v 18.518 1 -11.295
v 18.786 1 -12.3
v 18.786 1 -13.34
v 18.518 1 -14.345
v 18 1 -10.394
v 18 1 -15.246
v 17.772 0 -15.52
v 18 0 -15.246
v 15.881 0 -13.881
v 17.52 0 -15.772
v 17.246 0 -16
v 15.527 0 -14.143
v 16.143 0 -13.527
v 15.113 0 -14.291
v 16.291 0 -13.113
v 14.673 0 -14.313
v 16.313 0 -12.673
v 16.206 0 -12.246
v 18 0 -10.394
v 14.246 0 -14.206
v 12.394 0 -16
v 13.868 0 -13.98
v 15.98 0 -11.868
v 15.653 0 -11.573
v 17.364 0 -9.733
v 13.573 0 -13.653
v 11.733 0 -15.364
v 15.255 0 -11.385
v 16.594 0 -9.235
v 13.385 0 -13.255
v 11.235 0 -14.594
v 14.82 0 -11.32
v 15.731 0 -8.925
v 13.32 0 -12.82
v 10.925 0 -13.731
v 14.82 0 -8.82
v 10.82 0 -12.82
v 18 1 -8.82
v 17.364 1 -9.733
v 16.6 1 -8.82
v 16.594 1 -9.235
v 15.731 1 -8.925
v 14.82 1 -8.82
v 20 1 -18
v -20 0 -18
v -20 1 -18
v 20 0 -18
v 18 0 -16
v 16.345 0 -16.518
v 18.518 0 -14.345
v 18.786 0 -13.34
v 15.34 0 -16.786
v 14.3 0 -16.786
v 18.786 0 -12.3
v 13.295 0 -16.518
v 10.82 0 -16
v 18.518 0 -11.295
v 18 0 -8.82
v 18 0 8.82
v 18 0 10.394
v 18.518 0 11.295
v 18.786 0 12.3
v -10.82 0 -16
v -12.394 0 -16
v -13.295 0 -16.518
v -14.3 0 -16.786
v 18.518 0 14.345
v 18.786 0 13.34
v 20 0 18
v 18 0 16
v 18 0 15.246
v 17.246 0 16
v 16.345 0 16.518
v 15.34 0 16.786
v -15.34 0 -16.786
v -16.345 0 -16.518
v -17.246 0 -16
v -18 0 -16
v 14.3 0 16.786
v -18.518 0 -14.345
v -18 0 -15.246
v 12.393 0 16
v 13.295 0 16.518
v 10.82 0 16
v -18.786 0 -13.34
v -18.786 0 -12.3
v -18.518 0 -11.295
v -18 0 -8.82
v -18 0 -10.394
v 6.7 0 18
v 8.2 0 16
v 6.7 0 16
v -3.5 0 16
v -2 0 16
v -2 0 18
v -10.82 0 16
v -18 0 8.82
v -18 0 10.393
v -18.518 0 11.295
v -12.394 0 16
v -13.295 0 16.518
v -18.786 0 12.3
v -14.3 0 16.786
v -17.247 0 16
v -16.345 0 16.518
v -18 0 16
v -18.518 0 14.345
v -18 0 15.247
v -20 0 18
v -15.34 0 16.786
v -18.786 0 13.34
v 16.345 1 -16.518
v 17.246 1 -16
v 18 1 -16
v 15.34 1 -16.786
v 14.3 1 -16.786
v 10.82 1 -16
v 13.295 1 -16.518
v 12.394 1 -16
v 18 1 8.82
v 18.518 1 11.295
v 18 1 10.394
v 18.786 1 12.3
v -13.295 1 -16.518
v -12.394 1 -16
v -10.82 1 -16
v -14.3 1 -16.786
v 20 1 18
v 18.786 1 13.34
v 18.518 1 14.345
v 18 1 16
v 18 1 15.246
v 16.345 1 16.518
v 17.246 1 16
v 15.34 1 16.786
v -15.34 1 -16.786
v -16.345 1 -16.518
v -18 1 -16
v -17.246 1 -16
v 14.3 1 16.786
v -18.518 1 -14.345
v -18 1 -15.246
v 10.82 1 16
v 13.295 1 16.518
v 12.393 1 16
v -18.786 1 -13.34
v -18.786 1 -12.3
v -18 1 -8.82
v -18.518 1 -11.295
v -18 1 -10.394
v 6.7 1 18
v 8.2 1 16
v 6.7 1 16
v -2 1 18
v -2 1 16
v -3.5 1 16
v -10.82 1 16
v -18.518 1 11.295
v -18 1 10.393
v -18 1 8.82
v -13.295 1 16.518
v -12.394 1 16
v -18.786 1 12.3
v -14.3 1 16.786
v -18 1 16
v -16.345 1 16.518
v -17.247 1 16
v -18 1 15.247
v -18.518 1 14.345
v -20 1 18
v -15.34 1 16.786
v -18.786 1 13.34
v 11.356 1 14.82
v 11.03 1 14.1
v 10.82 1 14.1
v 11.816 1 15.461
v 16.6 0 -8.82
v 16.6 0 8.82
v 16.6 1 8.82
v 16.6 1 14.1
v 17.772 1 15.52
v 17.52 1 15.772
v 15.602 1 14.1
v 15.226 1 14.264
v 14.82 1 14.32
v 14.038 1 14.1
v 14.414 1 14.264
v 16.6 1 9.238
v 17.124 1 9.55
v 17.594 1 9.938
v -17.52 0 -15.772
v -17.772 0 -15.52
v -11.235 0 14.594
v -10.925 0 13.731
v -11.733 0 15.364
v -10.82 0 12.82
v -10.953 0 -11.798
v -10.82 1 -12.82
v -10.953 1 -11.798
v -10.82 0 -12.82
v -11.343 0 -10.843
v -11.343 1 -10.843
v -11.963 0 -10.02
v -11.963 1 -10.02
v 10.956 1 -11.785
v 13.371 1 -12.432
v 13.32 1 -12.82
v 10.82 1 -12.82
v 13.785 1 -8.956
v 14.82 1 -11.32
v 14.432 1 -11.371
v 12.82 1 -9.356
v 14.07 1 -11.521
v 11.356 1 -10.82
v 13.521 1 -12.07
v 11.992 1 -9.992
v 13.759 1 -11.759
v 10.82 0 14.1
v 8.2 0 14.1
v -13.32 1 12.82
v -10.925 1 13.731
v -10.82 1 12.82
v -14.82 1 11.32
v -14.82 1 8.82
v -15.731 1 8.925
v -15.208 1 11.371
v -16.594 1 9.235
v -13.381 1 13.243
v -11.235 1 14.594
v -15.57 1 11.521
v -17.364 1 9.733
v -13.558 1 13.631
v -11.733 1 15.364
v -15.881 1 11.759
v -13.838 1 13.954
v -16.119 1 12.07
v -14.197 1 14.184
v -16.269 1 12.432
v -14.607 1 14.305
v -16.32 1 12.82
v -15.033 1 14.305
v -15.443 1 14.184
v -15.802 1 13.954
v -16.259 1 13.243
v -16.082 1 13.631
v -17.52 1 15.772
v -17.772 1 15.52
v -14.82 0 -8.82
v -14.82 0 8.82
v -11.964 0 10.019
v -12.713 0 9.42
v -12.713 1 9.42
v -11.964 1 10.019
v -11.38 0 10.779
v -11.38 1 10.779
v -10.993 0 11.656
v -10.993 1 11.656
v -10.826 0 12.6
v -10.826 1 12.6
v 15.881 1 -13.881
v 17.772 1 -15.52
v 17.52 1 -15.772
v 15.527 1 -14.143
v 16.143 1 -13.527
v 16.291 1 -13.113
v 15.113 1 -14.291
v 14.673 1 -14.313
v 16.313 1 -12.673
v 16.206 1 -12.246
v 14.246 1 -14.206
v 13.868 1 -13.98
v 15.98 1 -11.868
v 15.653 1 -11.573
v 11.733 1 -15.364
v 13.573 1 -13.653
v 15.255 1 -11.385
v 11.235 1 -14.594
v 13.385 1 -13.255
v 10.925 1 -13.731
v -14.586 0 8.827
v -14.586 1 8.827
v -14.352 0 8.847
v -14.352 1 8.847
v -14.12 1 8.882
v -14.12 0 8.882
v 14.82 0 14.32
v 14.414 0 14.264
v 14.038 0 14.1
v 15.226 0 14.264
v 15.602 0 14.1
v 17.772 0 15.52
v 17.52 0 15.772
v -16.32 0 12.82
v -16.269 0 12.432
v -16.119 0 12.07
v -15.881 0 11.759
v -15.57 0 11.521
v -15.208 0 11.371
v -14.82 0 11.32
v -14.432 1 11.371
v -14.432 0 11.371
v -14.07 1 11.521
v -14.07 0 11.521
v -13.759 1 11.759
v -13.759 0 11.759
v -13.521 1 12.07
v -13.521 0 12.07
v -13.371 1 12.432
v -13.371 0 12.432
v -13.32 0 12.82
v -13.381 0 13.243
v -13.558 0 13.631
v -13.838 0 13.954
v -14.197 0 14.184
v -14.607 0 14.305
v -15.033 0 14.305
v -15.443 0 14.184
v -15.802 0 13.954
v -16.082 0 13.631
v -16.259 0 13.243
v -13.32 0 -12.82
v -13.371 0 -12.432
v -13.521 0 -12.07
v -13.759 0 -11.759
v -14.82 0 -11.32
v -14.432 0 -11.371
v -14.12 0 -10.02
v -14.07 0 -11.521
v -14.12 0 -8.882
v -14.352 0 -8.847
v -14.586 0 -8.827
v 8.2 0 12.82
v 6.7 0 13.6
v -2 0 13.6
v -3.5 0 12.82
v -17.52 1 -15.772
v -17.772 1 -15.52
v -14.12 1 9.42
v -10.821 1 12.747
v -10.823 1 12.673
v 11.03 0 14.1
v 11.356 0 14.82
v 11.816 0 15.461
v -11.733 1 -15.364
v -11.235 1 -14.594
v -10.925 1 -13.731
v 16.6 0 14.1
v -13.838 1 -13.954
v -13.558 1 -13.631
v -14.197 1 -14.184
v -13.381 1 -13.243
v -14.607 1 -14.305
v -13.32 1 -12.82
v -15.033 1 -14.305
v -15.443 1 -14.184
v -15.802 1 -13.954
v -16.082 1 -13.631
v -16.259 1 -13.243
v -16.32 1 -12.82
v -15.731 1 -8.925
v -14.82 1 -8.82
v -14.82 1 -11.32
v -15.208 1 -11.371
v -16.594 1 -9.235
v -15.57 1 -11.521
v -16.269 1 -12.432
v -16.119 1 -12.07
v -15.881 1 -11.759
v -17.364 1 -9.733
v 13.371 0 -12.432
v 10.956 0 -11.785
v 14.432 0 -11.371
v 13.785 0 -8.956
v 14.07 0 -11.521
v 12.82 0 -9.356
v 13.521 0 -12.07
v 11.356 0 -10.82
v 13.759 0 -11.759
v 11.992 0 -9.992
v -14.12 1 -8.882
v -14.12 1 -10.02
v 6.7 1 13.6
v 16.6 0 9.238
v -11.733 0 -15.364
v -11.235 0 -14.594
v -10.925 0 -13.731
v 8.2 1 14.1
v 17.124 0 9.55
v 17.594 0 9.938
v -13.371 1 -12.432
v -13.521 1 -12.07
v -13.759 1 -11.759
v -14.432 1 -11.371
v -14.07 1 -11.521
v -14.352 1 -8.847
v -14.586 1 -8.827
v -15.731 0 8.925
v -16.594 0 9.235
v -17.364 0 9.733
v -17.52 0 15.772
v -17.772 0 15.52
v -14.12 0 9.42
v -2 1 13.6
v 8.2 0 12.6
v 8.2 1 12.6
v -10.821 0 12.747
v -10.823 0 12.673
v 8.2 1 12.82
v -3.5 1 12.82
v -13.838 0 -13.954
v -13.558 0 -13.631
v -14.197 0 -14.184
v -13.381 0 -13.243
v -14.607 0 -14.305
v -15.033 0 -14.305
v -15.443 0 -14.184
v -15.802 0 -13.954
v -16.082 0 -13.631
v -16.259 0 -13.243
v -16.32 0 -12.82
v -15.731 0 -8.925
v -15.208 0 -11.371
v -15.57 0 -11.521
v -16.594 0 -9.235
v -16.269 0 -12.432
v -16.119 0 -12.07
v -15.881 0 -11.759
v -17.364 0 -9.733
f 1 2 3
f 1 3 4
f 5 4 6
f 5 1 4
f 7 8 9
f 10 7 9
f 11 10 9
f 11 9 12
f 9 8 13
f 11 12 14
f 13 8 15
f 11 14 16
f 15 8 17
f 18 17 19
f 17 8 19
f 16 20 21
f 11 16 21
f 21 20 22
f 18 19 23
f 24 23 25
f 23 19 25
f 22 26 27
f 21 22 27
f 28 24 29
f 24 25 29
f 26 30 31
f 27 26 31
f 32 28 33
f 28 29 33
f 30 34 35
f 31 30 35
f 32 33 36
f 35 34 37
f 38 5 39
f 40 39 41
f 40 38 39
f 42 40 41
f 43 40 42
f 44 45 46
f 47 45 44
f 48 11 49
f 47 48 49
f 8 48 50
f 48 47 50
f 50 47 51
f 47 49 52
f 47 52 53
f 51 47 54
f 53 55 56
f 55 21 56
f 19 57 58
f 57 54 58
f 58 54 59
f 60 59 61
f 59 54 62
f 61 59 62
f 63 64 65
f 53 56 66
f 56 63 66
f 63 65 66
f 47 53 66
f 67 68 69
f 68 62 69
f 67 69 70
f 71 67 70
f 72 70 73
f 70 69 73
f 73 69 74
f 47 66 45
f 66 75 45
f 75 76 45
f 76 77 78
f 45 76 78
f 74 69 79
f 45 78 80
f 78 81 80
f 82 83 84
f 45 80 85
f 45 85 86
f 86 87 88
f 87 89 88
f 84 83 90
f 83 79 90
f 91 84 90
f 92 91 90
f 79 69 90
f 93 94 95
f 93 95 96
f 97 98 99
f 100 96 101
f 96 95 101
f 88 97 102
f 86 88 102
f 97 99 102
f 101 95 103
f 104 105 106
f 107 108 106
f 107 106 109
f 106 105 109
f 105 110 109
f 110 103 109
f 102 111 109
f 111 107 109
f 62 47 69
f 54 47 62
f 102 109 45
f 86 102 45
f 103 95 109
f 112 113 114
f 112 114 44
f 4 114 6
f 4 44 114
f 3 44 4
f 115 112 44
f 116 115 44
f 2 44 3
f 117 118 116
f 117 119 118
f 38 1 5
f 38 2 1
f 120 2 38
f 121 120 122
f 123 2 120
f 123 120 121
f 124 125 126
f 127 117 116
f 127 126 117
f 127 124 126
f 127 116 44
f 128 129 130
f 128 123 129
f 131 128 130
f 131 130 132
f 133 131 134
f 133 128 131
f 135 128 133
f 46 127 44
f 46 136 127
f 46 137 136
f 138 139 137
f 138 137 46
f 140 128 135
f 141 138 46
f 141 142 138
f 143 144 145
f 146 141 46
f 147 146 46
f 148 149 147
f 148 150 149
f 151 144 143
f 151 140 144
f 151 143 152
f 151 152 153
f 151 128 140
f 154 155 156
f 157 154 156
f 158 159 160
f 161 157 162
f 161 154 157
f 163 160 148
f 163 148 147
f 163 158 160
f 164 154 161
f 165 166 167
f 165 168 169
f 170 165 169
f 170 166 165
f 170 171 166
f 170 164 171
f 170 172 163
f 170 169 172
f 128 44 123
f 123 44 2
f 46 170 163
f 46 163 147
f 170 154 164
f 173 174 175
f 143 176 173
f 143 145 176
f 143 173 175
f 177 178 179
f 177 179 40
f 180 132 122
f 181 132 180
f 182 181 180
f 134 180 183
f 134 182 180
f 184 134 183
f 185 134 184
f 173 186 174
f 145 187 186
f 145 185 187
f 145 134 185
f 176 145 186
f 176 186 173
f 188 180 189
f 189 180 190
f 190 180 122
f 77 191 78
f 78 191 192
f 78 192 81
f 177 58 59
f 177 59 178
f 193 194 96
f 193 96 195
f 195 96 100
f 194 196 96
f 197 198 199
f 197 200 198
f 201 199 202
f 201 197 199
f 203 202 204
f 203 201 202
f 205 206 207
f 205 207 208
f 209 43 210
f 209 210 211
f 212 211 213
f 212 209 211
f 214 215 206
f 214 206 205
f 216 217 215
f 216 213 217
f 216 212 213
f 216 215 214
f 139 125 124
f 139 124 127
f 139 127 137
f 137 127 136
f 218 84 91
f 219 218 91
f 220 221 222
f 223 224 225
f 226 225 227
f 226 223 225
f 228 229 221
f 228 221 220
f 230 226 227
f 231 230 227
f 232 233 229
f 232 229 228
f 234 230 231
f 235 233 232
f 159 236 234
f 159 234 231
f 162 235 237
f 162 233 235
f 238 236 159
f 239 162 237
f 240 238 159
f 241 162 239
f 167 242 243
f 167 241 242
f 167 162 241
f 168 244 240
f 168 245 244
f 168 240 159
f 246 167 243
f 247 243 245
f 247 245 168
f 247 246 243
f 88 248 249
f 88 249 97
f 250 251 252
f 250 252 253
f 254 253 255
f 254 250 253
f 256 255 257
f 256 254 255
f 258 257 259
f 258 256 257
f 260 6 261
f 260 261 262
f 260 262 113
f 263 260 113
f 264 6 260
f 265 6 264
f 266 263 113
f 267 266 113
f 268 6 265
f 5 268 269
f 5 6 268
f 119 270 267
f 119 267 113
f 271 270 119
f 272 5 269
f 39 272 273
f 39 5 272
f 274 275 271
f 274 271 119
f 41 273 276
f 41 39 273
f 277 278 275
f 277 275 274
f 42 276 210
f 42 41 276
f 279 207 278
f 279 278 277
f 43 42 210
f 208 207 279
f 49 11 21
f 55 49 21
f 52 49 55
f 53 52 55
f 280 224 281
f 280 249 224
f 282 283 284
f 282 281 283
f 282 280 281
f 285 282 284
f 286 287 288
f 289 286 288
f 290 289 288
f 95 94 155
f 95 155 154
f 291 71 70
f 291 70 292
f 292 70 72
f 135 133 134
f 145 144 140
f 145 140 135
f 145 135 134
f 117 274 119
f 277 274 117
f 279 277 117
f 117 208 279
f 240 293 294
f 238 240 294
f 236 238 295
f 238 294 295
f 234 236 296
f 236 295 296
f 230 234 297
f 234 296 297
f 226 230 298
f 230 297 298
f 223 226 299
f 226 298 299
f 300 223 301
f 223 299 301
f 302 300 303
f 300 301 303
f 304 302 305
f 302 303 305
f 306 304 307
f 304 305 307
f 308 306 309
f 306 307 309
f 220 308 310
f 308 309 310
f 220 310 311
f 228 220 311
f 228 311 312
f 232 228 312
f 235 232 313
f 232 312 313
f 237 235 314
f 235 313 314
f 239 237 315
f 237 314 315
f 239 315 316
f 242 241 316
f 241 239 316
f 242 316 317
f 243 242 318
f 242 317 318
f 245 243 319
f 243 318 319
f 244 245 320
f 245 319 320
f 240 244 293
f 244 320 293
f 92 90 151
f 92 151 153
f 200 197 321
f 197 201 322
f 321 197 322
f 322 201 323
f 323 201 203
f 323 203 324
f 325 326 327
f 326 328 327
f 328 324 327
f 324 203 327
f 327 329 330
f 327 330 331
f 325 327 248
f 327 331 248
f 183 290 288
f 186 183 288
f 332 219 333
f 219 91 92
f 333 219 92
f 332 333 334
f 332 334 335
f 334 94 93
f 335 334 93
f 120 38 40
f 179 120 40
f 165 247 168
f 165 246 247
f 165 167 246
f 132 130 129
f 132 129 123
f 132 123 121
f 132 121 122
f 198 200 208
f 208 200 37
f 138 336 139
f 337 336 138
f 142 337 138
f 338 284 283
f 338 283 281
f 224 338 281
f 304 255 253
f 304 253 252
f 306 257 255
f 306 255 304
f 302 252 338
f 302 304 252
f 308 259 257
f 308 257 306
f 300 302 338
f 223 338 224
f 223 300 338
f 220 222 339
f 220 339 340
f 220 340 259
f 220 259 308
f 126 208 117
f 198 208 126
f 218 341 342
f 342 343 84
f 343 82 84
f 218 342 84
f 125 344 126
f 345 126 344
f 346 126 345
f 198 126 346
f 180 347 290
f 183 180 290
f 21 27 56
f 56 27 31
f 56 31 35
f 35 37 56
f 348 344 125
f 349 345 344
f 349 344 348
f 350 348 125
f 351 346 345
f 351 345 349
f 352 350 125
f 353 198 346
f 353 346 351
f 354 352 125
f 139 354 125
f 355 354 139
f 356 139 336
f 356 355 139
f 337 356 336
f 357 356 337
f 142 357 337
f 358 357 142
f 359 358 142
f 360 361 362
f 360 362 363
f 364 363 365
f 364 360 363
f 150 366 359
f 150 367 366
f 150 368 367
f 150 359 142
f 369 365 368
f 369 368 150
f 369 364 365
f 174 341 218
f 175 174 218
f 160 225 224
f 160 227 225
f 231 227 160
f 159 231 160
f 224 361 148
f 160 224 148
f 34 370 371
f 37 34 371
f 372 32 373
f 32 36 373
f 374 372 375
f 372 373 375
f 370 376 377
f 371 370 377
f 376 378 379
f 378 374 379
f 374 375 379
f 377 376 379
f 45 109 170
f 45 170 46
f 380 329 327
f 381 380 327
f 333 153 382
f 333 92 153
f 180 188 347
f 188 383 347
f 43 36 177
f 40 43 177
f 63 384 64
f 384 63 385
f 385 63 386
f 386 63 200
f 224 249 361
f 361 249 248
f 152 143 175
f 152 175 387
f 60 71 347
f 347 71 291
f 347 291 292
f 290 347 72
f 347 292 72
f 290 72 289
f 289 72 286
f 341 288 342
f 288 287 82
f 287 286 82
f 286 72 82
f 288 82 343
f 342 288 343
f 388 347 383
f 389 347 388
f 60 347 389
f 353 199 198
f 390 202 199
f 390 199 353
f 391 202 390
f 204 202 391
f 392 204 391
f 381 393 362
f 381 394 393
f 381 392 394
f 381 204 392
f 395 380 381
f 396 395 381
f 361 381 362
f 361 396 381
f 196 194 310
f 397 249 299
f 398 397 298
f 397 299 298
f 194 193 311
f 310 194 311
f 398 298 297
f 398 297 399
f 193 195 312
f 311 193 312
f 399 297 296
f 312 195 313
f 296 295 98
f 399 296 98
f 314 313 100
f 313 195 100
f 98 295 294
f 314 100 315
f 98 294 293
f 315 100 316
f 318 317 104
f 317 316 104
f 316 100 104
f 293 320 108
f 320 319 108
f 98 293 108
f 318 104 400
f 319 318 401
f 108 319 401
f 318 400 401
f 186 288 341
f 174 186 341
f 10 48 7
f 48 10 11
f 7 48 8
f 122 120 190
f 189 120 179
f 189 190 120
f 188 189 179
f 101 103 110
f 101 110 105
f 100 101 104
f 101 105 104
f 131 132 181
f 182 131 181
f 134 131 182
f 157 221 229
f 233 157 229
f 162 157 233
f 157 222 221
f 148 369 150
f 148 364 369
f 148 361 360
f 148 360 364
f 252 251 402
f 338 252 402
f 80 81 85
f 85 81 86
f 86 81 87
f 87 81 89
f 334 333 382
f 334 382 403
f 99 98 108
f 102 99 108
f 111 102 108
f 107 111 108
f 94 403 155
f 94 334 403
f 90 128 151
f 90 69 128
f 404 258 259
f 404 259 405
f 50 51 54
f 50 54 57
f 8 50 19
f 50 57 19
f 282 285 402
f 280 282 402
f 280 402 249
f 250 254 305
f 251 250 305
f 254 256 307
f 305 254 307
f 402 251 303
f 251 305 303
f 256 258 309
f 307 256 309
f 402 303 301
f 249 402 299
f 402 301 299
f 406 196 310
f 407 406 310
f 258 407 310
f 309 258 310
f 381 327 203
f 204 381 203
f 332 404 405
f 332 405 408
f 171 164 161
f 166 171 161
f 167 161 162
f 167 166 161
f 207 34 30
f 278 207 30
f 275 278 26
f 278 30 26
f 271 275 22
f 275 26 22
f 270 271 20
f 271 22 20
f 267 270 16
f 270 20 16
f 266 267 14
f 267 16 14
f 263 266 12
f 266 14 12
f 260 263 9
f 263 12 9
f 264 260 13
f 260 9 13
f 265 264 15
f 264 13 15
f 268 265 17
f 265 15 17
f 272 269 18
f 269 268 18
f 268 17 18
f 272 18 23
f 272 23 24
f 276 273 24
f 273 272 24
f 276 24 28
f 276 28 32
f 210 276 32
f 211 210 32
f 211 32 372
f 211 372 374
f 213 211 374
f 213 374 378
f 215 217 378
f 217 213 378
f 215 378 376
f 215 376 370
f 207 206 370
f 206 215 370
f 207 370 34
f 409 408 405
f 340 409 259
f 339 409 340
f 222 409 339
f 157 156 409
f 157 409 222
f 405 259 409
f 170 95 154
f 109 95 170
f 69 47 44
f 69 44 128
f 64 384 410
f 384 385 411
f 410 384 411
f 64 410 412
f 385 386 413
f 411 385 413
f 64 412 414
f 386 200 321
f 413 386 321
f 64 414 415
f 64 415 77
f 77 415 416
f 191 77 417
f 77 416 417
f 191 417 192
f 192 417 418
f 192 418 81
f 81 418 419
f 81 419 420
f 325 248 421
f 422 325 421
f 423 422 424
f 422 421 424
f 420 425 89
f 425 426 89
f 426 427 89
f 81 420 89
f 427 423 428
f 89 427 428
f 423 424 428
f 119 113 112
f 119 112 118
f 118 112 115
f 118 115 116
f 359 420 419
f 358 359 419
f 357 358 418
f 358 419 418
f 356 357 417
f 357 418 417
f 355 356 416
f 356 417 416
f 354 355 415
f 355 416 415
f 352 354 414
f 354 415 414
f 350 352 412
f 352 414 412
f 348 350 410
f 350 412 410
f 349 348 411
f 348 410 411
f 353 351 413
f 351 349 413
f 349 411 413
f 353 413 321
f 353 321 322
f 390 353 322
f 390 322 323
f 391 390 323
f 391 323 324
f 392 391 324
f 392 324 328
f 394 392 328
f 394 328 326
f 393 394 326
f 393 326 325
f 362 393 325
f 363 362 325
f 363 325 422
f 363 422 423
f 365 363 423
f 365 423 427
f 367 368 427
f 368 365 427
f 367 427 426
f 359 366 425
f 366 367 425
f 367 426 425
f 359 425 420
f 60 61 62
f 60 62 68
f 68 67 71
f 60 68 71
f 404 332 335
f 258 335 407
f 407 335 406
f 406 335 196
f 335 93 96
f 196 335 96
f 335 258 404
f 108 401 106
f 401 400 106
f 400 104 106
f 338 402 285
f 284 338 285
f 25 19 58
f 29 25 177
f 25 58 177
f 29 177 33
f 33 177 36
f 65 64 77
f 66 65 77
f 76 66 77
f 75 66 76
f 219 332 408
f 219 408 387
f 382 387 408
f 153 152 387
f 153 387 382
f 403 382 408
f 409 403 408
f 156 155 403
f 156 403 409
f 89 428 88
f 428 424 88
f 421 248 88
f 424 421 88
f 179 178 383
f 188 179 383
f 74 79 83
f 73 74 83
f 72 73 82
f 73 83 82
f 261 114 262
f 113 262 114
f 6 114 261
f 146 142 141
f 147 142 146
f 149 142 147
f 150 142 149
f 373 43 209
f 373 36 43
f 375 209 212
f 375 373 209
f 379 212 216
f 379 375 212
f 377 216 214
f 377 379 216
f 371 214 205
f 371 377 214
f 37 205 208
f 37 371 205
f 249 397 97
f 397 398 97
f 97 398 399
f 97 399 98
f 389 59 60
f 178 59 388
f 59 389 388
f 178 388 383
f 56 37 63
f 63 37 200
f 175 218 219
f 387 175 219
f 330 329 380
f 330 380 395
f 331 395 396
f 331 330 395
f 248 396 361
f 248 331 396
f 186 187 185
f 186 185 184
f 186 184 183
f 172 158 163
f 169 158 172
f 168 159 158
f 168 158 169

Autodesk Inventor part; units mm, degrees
ref_plane "YZ Plane" through (0, 0, 0) normal (1, 0, 0) x (0, 1, 0)
ref_plane "XZ Plane" through (0, 0, 0) normal (0, 1, 0) x (-1, 0, 0)
ref_plane "XY Plane" through (0, 0, 0) normal (0, 0, 1) x (1, 0, 0)
sketch "Эскиз1" plane through (0, 0, 0) normal (0, 1, 0) x (-1, 0, 0)
  line L0 (18, -16) -> (-18, -16)
  line L1 (-18, -16) -> (-18, 16)
  line L2 (-18, 16) -> (18, 16)
  line L3 (18, 16) -> (18, -16)
  line L4 (14.82, -12.82) -> (-14.82, -12.82)
  line L5 (-14.82, -12.82) -> (-14.82, 12.82)
  line L6 (-14.82, 12.82) -> (14.82, 12.82)
  line L7 (14.82, 12.82) -> (14.82, -12.82)
  circle A0 centre (14.82, -12.82) radius 1.5
  circle A1 centre (14.82, 12.82) radius 1.5
  circle A2 centre (-14.82, 12.82) radius 1.5
  circle A3 centre (-14.82, -12.82) radius 1.5
  arc A4 (11.9634, -10.02) -> (14.12, -8.8817) centre (14.82, -12.82) ccw
  circle A5 centre (-14.82, -12.82) radius 4
  arc A6 (14.12, 8.8817) -> (12.7129, 9.42) centre (14.82, 12.82) ccw
  arc A7 (-11.0303, 14.1) -> (-16.6, 9.2379) centre (-14.82, 12.82) ccw
  line L8 (14.12, -10.02) -> (1.12, -10.02)
  line L9 (1.12, -10.02) -> (1.12, 9.42)
  line L10 (1.12, 9.42) -> (14.12, 9.42)
  line L11 (14.12, 9.42) -> (14.12, -10.02)
  line L12 (-9.6, 7.9) -> (-16.6, 7.9)
  line L13 (-16.6, 7.9) -> (-16.6, 14.1)
  line L14 (-16.6, 14.1) -> (-9.6, 14.1)
  line L15 (-9.6, 14.1) -> (-9.6, 7.9)
  line L16 (-11.0303, 14.1) -> (-16.6, 14.1)
  line L17 (14.12, 8.8817) -> (14.12, 9.42)
  line L18 (14.12, -8.8817) -> (14.12, -10.02)
  line L19 (11.9634, -10.02) -> (14.12, -10.02)
  circle A8 centre (-13.034, 10.913) radius 1.5
  circle A9 centre (-13.034, 10.913) radius 1.25
  line L20 (20, -18) -> (-20, -18)
  line L21 (-20, -18) -> (-20, 18)
  line L22 (-20, 18) -> (20, 18)
  line L23 (20, 18) -> (20, -18)
  line L24 (-10.82, -12.82) -> (-10.82, -16)
  line L25 (-14.82, -8.82) -> (-18, -8.82)
  line L26 (10.82, -12.82) -> (10.82, -16)
  line L27 (14.82, -8.82) -> (18, -8.82)
  line L28 (14.82, 8.82) -> (18, 8.82)
  line L29 (10.82, 12.82) -> (10.82, 16)
  line L30 (-18, 8.82) -> (-16.6, 8.82)
  line L31 (-10.82, 16) -> (-10.82, 14.1)
  line L32 (-10.82, 14.1) -> (-11.0303, 14.1)
  line L33 (-16.6, 9.2379) -> (-16.6, 8.82)
  line L34 (3.5, 16) -> (3.5, 12.6)
  line L35 (3.5, 12.6) -> (-8.2, 12.6)
  line L36 (-8.2, 12.6) -> (-8.2, 16)
  line L37 (-6.7, 18) -> (-6.7, 13.6)
  line L38 (-6.7, 13.6) -> (2, 13.6)
  line L39 (2, 13.6) -> (2, 18)
  line L40 (3.5, 16) -> (3.5, 12.6)
  line L41 (-8.2, 12.6) -> (3.5, 12.6)
  line L42 (-8.2, 12.6) -> (-8.2, 16)
  line L43 (-8.2, 16) -> (-6.7, 16)
  line L44 (-6.7, 16) -> (-6.7, 13.6)
  line L45 (-6.7, 13.6) -> (2, 13.6)
  line L46 (2, 13.6) -> (2, 16)
  line L47 (2, 16) -> (3.5, 16)
  line L48 (-10.82, 14.1) -> (-8.2, 14.1)
  line L49 (-8.2, 14.1) -> (-8.2, 16)
  line L50 (3.5, 12.6) -> (10.8261, 12.6)
  line L51 (10.8261, 12.6) -> (10.82, 12.82)
  line L52 (10.82, 12.82) -> (3.5, 12.82)
  line L53 (3.5, 12.82) -> (3.5, 12.6)
  line L54 (-16.6, 7.9) -> (-16.6, -8.82)
  line L55 (-16.6, -8.82) -> (-18, -8.82)
  line L56 (-18, -8.82) -> (-18, 8.82)
  point P0 (0, 0)
  dimension "d0" = 36
  dimension "d1" = 32
  dimension "d2" = 3.18
  dimension "d3" = 3.18
  dimension "d4" = 3.18
  dimension "d5" = 3.18
  dimension "d6" = 3
  dimension "d7" = 3
  dimension "d8" = 3
  dimension "d9" = 3
  dimension "d10" = 8
  dimension "d11" = 8
  dimension "d12" = 8
  dimension "d13" = 8
  dimension "d14" = 2.8
  dimension "d15" = 0.7
  dimension "d16" = 3.4
  dimension "d17" = 13
  dimension "d18" = 1.9
  dimension "d19" = 1.4
  dimension "d20" = 7
  dimension "d21" = 6.2
  dimension "d22" = 4.966
  dimension "d23" = 5.087
  dimension "d24" = 3
  dimension "d25" = 2.5
  dimension "d26" = 2
  dimension "d27" = 2
  dimension "d28" = 2
  dimension "d29" = 2
  dimension "d30" = 4
  dimension "d31" = 4
  dimension "d32" = 16
  dimension "d33" = 11.3
  dimension "d34" = 1
  dimension "d35" = 1.5
  dimension "d36" = 1.5
  dimension "d37" = 2.4
extrude "Выдавливание1" add sketch "Эскиз1" along normal blind 1 contours L0 A4 L3 A6 L2 L39 L22 L23 L20 L21 L37 A7 L1 A5 | L26 A4 L0 | L0 L24 L4 L26 | L0 A5 L24 | A4 L4 A0 L7 L3 L0 | L0 A4 | A4 L8 L11 L7 A0 L4 | A5 L0 | L0 A5 L1 L5 A3 L4 | L4 A3 L5 A5 | A4 L3 L0 | A0 L7 L4 | L4 L7 A0 | L0 L1 A5 | A3 L5 L4 | L4 L5 A3 | A5 L1 L25 | L3 A4 | A5 L1 | A4 L27 L3 | L7 L28 L3 L27 | A6 L11 L10 L6 A1 L7 | L7 A1 L6 A6 L2 L3 | A6 L3 L28 | L14 L13 A7 L1 L2 A2 | A2 L14 | L30 L1 A7 L13 | A1 L6 L7 | L7 L6 A1 | L3 A6 | L36 L2 L37 L38 L39 L34 L6 | A7 L1 | A6 L2 L3 | L29 L2 A6 | A7 L2 L31 L14 | L1 L2 A7 | L2 A6 | L2 A7
extrude "Выдавливание2" add sketch "Эскиз1" along normal blind 1 contours L25 L1 L30 L13 L54 | L14 L13 A7 L1 L2 A2 | A2 L14 | L30 L1 A7 L13 | L50 L34 L6 A6 | L36 L2 L37 L38 L39 L34 L6 | L6 L34 L35 L36 | L14 L31 L2 L36 L48 | L6 L34 L2 L29 | A7 L2 L31 L14 | L1 L2 A7
extrude "Выдавливание3" cut sketch "Эскиз1" along normal blind 1 contours A0 L7 L4 | L4 L7 A0 | A3 L5 L4 | L4 L5 A3 | A1 L6 L7 | L7 L6 A1
equation "\"d6\" = d9"
equation "\"d7\" = d9"
equation "\"d8\" = d9"
properties part number "resin_top"
